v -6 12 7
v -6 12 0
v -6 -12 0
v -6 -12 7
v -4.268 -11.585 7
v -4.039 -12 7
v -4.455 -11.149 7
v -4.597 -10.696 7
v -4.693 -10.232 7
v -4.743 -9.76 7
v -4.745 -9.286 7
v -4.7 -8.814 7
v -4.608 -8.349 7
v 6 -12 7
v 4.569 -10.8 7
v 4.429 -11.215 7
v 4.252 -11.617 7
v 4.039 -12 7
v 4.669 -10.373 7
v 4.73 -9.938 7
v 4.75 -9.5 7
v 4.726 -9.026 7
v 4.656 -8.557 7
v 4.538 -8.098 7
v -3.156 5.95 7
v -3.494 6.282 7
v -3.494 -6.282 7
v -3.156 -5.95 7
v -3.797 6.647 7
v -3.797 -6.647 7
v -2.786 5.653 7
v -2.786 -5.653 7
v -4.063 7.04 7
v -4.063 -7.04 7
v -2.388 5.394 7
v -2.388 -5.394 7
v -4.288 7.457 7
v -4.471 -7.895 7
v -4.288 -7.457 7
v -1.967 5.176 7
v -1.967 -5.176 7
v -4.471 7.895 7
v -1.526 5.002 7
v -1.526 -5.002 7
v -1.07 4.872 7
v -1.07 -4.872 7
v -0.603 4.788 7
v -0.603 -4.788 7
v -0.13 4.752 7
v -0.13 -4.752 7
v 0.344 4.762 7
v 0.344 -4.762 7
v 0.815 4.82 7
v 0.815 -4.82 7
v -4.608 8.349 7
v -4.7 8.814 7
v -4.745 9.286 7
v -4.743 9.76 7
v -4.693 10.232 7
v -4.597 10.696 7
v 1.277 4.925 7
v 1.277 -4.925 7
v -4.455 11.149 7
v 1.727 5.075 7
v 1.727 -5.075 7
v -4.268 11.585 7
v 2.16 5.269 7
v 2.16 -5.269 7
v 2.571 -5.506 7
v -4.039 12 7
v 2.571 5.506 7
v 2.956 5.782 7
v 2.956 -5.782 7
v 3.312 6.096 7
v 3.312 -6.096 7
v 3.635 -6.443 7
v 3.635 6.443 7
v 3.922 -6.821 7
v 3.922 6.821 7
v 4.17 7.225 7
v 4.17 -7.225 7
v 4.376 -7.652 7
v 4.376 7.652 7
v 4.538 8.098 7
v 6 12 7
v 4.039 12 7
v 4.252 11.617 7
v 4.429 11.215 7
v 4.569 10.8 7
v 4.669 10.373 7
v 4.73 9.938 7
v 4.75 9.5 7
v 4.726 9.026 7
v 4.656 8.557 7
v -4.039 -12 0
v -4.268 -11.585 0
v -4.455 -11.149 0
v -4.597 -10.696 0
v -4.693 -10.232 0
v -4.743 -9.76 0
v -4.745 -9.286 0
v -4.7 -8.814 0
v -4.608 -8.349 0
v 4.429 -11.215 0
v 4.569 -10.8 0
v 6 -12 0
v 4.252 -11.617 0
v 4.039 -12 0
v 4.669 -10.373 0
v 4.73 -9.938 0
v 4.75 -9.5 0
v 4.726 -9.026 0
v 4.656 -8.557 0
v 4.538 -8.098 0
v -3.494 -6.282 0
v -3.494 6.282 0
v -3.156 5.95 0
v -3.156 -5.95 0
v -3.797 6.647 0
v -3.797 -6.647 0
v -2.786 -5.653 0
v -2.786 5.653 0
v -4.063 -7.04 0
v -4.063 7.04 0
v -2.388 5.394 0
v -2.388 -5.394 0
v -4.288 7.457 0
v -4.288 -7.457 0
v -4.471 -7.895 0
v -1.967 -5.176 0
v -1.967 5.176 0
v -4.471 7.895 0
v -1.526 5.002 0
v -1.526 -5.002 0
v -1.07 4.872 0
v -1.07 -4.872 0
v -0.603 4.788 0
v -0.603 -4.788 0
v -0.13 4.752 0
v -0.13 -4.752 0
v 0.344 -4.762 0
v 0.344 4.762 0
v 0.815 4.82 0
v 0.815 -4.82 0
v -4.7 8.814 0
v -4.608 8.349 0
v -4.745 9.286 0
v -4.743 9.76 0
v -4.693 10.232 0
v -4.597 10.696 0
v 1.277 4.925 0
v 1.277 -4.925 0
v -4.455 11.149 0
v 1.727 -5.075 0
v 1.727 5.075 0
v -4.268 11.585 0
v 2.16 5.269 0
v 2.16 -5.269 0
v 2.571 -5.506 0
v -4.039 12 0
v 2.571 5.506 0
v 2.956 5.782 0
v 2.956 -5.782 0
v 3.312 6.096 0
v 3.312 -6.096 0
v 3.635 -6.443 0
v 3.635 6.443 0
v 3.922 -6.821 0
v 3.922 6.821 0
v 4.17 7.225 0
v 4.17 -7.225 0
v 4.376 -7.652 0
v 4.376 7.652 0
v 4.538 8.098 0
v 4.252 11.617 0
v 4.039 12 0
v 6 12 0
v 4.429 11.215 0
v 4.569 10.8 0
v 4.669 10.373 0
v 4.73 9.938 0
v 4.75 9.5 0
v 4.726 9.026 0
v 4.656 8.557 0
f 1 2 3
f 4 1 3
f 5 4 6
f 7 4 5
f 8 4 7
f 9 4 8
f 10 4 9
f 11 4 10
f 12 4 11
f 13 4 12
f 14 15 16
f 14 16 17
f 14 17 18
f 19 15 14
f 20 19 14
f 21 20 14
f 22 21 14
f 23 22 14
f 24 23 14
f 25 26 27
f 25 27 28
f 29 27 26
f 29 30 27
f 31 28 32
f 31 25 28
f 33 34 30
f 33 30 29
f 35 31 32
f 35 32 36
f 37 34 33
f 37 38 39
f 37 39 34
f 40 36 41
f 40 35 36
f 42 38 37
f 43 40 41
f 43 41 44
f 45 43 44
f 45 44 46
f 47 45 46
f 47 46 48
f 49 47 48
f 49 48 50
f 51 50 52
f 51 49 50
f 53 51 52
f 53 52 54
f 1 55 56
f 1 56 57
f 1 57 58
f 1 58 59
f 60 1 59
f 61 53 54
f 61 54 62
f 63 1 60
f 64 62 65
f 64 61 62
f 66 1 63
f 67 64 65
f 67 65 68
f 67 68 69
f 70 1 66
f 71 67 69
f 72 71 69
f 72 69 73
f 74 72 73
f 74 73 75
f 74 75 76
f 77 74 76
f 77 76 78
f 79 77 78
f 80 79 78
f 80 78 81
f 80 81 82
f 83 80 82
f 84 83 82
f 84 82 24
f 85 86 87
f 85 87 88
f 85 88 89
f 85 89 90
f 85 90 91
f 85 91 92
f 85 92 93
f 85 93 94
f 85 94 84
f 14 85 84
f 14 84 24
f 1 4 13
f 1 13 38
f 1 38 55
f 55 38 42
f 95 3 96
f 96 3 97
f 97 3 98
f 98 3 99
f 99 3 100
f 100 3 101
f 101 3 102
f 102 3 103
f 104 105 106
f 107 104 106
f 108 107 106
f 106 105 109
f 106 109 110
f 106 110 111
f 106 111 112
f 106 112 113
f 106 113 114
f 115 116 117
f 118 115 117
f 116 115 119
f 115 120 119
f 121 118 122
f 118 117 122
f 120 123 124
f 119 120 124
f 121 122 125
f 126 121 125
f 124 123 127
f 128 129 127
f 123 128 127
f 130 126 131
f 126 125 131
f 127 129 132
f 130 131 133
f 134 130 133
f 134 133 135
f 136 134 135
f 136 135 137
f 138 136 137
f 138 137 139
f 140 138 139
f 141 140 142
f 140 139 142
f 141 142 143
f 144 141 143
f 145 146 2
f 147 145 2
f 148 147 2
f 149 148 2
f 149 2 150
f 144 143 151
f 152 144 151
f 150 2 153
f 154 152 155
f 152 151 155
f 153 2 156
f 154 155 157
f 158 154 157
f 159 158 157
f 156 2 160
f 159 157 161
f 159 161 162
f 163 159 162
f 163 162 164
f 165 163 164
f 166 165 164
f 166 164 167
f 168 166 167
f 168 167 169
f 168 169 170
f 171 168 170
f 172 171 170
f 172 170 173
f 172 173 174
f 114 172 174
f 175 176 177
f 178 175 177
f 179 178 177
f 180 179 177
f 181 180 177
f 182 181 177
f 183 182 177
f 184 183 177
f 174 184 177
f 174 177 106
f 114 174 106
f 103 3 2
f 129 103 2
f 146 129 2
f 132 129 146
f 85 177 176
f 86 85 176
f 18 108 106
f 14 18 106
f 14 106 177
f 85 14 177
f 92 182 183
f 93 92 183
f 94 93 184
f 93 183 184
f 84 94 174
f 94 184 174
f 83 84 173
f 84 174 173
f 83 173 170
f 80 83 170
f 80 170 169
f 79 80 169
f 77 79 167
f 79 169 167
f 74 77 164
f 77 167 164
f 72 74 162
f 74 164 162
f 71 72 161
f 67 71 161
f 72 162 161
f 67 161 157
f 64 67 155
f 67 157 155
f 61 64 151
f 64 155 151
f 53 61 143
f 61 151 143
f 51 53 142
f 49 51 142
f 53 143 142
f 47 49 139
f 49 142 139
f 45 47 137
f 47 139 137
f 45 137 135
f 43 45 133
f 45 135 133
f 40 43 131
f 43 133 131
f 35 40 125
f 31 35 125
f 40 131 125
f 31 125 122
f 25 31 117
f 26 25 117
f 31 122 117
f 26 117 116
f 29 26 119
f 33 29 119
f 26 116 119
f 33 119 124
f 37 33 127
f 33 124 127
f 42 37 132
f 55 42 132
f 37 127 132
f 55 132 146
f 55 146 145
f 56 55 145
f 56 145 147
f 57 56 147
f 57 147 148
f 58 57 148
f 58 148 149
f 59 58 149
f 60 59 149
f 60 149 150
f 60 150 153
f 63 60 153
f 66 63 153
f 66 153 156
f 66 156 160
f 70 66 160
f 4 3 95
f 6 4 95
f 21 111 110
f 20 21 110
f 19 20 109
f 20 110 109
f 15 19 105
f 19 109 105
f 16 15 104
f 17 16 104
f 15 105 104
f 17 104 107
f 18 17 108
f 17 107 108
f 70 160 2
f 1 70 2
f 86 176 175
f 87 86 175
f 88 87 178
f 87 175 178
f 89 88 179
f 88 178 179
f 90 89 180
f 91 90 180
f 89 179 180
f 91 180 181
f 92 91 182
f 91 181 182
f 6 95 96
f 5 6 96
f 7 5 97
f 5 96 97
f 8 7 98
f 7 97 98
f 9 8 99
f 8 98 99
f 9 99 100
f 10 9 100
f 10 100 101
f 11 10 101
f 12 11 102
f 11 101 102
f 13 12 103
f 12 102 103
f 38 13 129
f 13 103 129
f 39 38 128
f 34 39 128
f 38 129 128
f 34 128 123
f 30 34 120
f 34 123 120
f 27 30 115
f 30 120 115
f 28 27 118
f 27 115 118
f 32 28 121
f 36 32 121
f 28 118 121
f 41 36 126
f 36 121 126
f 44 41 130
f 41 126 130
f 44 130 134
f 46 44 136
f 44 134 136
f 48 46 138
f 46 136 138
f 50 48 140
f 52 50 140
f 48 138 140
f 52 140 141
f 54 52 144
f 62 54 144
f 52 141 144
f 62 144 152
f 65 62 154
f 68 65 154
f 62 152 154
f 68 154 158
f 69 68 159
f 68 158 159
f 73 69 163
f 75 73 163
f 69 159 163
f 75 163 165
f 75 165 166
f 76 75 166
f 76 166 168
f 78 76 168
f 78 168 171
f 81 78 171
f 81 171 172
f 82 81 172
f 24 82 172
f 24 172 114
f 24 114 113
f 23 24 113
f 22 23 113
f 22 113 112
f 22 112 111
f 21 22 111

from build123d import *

# Parameters (mm, degrees)
F1_DEPTH = 7


with BuildPart() as f1:
    # F0 (on Top) → F1 (new body)
    with BuildSketch(Plane.XY):
        with BuildLine():
            Line((6, -12), (6, 12))
            Line((6, 12), (4.038874, 12))
            ThreePointArc((4.038874, 12), (4.568761, 10.799587), (4.75, 9.5))
            ThreePointArc((4.75, 9.5), (-1.299587, 4.931239), (-4.038874, 12))
            Line((-4.038874, 12), (-6, 12))
            Line((-6, 12), (-6, -12))
            Line((-6, -12), (-4.038874, -12))
            ThreePointArc((-4.038874, -12), (-1.299587, -4.931239), (4.75, -9.5))
            ThreePointArc((4.75, -9.5), (4.568761, -10.799587), (4.038874, -12))
            Line((4.038874, -12), (6, -12))
        make_face()
    extrude(amount=F1_DEPTH)


solid = f1.part
